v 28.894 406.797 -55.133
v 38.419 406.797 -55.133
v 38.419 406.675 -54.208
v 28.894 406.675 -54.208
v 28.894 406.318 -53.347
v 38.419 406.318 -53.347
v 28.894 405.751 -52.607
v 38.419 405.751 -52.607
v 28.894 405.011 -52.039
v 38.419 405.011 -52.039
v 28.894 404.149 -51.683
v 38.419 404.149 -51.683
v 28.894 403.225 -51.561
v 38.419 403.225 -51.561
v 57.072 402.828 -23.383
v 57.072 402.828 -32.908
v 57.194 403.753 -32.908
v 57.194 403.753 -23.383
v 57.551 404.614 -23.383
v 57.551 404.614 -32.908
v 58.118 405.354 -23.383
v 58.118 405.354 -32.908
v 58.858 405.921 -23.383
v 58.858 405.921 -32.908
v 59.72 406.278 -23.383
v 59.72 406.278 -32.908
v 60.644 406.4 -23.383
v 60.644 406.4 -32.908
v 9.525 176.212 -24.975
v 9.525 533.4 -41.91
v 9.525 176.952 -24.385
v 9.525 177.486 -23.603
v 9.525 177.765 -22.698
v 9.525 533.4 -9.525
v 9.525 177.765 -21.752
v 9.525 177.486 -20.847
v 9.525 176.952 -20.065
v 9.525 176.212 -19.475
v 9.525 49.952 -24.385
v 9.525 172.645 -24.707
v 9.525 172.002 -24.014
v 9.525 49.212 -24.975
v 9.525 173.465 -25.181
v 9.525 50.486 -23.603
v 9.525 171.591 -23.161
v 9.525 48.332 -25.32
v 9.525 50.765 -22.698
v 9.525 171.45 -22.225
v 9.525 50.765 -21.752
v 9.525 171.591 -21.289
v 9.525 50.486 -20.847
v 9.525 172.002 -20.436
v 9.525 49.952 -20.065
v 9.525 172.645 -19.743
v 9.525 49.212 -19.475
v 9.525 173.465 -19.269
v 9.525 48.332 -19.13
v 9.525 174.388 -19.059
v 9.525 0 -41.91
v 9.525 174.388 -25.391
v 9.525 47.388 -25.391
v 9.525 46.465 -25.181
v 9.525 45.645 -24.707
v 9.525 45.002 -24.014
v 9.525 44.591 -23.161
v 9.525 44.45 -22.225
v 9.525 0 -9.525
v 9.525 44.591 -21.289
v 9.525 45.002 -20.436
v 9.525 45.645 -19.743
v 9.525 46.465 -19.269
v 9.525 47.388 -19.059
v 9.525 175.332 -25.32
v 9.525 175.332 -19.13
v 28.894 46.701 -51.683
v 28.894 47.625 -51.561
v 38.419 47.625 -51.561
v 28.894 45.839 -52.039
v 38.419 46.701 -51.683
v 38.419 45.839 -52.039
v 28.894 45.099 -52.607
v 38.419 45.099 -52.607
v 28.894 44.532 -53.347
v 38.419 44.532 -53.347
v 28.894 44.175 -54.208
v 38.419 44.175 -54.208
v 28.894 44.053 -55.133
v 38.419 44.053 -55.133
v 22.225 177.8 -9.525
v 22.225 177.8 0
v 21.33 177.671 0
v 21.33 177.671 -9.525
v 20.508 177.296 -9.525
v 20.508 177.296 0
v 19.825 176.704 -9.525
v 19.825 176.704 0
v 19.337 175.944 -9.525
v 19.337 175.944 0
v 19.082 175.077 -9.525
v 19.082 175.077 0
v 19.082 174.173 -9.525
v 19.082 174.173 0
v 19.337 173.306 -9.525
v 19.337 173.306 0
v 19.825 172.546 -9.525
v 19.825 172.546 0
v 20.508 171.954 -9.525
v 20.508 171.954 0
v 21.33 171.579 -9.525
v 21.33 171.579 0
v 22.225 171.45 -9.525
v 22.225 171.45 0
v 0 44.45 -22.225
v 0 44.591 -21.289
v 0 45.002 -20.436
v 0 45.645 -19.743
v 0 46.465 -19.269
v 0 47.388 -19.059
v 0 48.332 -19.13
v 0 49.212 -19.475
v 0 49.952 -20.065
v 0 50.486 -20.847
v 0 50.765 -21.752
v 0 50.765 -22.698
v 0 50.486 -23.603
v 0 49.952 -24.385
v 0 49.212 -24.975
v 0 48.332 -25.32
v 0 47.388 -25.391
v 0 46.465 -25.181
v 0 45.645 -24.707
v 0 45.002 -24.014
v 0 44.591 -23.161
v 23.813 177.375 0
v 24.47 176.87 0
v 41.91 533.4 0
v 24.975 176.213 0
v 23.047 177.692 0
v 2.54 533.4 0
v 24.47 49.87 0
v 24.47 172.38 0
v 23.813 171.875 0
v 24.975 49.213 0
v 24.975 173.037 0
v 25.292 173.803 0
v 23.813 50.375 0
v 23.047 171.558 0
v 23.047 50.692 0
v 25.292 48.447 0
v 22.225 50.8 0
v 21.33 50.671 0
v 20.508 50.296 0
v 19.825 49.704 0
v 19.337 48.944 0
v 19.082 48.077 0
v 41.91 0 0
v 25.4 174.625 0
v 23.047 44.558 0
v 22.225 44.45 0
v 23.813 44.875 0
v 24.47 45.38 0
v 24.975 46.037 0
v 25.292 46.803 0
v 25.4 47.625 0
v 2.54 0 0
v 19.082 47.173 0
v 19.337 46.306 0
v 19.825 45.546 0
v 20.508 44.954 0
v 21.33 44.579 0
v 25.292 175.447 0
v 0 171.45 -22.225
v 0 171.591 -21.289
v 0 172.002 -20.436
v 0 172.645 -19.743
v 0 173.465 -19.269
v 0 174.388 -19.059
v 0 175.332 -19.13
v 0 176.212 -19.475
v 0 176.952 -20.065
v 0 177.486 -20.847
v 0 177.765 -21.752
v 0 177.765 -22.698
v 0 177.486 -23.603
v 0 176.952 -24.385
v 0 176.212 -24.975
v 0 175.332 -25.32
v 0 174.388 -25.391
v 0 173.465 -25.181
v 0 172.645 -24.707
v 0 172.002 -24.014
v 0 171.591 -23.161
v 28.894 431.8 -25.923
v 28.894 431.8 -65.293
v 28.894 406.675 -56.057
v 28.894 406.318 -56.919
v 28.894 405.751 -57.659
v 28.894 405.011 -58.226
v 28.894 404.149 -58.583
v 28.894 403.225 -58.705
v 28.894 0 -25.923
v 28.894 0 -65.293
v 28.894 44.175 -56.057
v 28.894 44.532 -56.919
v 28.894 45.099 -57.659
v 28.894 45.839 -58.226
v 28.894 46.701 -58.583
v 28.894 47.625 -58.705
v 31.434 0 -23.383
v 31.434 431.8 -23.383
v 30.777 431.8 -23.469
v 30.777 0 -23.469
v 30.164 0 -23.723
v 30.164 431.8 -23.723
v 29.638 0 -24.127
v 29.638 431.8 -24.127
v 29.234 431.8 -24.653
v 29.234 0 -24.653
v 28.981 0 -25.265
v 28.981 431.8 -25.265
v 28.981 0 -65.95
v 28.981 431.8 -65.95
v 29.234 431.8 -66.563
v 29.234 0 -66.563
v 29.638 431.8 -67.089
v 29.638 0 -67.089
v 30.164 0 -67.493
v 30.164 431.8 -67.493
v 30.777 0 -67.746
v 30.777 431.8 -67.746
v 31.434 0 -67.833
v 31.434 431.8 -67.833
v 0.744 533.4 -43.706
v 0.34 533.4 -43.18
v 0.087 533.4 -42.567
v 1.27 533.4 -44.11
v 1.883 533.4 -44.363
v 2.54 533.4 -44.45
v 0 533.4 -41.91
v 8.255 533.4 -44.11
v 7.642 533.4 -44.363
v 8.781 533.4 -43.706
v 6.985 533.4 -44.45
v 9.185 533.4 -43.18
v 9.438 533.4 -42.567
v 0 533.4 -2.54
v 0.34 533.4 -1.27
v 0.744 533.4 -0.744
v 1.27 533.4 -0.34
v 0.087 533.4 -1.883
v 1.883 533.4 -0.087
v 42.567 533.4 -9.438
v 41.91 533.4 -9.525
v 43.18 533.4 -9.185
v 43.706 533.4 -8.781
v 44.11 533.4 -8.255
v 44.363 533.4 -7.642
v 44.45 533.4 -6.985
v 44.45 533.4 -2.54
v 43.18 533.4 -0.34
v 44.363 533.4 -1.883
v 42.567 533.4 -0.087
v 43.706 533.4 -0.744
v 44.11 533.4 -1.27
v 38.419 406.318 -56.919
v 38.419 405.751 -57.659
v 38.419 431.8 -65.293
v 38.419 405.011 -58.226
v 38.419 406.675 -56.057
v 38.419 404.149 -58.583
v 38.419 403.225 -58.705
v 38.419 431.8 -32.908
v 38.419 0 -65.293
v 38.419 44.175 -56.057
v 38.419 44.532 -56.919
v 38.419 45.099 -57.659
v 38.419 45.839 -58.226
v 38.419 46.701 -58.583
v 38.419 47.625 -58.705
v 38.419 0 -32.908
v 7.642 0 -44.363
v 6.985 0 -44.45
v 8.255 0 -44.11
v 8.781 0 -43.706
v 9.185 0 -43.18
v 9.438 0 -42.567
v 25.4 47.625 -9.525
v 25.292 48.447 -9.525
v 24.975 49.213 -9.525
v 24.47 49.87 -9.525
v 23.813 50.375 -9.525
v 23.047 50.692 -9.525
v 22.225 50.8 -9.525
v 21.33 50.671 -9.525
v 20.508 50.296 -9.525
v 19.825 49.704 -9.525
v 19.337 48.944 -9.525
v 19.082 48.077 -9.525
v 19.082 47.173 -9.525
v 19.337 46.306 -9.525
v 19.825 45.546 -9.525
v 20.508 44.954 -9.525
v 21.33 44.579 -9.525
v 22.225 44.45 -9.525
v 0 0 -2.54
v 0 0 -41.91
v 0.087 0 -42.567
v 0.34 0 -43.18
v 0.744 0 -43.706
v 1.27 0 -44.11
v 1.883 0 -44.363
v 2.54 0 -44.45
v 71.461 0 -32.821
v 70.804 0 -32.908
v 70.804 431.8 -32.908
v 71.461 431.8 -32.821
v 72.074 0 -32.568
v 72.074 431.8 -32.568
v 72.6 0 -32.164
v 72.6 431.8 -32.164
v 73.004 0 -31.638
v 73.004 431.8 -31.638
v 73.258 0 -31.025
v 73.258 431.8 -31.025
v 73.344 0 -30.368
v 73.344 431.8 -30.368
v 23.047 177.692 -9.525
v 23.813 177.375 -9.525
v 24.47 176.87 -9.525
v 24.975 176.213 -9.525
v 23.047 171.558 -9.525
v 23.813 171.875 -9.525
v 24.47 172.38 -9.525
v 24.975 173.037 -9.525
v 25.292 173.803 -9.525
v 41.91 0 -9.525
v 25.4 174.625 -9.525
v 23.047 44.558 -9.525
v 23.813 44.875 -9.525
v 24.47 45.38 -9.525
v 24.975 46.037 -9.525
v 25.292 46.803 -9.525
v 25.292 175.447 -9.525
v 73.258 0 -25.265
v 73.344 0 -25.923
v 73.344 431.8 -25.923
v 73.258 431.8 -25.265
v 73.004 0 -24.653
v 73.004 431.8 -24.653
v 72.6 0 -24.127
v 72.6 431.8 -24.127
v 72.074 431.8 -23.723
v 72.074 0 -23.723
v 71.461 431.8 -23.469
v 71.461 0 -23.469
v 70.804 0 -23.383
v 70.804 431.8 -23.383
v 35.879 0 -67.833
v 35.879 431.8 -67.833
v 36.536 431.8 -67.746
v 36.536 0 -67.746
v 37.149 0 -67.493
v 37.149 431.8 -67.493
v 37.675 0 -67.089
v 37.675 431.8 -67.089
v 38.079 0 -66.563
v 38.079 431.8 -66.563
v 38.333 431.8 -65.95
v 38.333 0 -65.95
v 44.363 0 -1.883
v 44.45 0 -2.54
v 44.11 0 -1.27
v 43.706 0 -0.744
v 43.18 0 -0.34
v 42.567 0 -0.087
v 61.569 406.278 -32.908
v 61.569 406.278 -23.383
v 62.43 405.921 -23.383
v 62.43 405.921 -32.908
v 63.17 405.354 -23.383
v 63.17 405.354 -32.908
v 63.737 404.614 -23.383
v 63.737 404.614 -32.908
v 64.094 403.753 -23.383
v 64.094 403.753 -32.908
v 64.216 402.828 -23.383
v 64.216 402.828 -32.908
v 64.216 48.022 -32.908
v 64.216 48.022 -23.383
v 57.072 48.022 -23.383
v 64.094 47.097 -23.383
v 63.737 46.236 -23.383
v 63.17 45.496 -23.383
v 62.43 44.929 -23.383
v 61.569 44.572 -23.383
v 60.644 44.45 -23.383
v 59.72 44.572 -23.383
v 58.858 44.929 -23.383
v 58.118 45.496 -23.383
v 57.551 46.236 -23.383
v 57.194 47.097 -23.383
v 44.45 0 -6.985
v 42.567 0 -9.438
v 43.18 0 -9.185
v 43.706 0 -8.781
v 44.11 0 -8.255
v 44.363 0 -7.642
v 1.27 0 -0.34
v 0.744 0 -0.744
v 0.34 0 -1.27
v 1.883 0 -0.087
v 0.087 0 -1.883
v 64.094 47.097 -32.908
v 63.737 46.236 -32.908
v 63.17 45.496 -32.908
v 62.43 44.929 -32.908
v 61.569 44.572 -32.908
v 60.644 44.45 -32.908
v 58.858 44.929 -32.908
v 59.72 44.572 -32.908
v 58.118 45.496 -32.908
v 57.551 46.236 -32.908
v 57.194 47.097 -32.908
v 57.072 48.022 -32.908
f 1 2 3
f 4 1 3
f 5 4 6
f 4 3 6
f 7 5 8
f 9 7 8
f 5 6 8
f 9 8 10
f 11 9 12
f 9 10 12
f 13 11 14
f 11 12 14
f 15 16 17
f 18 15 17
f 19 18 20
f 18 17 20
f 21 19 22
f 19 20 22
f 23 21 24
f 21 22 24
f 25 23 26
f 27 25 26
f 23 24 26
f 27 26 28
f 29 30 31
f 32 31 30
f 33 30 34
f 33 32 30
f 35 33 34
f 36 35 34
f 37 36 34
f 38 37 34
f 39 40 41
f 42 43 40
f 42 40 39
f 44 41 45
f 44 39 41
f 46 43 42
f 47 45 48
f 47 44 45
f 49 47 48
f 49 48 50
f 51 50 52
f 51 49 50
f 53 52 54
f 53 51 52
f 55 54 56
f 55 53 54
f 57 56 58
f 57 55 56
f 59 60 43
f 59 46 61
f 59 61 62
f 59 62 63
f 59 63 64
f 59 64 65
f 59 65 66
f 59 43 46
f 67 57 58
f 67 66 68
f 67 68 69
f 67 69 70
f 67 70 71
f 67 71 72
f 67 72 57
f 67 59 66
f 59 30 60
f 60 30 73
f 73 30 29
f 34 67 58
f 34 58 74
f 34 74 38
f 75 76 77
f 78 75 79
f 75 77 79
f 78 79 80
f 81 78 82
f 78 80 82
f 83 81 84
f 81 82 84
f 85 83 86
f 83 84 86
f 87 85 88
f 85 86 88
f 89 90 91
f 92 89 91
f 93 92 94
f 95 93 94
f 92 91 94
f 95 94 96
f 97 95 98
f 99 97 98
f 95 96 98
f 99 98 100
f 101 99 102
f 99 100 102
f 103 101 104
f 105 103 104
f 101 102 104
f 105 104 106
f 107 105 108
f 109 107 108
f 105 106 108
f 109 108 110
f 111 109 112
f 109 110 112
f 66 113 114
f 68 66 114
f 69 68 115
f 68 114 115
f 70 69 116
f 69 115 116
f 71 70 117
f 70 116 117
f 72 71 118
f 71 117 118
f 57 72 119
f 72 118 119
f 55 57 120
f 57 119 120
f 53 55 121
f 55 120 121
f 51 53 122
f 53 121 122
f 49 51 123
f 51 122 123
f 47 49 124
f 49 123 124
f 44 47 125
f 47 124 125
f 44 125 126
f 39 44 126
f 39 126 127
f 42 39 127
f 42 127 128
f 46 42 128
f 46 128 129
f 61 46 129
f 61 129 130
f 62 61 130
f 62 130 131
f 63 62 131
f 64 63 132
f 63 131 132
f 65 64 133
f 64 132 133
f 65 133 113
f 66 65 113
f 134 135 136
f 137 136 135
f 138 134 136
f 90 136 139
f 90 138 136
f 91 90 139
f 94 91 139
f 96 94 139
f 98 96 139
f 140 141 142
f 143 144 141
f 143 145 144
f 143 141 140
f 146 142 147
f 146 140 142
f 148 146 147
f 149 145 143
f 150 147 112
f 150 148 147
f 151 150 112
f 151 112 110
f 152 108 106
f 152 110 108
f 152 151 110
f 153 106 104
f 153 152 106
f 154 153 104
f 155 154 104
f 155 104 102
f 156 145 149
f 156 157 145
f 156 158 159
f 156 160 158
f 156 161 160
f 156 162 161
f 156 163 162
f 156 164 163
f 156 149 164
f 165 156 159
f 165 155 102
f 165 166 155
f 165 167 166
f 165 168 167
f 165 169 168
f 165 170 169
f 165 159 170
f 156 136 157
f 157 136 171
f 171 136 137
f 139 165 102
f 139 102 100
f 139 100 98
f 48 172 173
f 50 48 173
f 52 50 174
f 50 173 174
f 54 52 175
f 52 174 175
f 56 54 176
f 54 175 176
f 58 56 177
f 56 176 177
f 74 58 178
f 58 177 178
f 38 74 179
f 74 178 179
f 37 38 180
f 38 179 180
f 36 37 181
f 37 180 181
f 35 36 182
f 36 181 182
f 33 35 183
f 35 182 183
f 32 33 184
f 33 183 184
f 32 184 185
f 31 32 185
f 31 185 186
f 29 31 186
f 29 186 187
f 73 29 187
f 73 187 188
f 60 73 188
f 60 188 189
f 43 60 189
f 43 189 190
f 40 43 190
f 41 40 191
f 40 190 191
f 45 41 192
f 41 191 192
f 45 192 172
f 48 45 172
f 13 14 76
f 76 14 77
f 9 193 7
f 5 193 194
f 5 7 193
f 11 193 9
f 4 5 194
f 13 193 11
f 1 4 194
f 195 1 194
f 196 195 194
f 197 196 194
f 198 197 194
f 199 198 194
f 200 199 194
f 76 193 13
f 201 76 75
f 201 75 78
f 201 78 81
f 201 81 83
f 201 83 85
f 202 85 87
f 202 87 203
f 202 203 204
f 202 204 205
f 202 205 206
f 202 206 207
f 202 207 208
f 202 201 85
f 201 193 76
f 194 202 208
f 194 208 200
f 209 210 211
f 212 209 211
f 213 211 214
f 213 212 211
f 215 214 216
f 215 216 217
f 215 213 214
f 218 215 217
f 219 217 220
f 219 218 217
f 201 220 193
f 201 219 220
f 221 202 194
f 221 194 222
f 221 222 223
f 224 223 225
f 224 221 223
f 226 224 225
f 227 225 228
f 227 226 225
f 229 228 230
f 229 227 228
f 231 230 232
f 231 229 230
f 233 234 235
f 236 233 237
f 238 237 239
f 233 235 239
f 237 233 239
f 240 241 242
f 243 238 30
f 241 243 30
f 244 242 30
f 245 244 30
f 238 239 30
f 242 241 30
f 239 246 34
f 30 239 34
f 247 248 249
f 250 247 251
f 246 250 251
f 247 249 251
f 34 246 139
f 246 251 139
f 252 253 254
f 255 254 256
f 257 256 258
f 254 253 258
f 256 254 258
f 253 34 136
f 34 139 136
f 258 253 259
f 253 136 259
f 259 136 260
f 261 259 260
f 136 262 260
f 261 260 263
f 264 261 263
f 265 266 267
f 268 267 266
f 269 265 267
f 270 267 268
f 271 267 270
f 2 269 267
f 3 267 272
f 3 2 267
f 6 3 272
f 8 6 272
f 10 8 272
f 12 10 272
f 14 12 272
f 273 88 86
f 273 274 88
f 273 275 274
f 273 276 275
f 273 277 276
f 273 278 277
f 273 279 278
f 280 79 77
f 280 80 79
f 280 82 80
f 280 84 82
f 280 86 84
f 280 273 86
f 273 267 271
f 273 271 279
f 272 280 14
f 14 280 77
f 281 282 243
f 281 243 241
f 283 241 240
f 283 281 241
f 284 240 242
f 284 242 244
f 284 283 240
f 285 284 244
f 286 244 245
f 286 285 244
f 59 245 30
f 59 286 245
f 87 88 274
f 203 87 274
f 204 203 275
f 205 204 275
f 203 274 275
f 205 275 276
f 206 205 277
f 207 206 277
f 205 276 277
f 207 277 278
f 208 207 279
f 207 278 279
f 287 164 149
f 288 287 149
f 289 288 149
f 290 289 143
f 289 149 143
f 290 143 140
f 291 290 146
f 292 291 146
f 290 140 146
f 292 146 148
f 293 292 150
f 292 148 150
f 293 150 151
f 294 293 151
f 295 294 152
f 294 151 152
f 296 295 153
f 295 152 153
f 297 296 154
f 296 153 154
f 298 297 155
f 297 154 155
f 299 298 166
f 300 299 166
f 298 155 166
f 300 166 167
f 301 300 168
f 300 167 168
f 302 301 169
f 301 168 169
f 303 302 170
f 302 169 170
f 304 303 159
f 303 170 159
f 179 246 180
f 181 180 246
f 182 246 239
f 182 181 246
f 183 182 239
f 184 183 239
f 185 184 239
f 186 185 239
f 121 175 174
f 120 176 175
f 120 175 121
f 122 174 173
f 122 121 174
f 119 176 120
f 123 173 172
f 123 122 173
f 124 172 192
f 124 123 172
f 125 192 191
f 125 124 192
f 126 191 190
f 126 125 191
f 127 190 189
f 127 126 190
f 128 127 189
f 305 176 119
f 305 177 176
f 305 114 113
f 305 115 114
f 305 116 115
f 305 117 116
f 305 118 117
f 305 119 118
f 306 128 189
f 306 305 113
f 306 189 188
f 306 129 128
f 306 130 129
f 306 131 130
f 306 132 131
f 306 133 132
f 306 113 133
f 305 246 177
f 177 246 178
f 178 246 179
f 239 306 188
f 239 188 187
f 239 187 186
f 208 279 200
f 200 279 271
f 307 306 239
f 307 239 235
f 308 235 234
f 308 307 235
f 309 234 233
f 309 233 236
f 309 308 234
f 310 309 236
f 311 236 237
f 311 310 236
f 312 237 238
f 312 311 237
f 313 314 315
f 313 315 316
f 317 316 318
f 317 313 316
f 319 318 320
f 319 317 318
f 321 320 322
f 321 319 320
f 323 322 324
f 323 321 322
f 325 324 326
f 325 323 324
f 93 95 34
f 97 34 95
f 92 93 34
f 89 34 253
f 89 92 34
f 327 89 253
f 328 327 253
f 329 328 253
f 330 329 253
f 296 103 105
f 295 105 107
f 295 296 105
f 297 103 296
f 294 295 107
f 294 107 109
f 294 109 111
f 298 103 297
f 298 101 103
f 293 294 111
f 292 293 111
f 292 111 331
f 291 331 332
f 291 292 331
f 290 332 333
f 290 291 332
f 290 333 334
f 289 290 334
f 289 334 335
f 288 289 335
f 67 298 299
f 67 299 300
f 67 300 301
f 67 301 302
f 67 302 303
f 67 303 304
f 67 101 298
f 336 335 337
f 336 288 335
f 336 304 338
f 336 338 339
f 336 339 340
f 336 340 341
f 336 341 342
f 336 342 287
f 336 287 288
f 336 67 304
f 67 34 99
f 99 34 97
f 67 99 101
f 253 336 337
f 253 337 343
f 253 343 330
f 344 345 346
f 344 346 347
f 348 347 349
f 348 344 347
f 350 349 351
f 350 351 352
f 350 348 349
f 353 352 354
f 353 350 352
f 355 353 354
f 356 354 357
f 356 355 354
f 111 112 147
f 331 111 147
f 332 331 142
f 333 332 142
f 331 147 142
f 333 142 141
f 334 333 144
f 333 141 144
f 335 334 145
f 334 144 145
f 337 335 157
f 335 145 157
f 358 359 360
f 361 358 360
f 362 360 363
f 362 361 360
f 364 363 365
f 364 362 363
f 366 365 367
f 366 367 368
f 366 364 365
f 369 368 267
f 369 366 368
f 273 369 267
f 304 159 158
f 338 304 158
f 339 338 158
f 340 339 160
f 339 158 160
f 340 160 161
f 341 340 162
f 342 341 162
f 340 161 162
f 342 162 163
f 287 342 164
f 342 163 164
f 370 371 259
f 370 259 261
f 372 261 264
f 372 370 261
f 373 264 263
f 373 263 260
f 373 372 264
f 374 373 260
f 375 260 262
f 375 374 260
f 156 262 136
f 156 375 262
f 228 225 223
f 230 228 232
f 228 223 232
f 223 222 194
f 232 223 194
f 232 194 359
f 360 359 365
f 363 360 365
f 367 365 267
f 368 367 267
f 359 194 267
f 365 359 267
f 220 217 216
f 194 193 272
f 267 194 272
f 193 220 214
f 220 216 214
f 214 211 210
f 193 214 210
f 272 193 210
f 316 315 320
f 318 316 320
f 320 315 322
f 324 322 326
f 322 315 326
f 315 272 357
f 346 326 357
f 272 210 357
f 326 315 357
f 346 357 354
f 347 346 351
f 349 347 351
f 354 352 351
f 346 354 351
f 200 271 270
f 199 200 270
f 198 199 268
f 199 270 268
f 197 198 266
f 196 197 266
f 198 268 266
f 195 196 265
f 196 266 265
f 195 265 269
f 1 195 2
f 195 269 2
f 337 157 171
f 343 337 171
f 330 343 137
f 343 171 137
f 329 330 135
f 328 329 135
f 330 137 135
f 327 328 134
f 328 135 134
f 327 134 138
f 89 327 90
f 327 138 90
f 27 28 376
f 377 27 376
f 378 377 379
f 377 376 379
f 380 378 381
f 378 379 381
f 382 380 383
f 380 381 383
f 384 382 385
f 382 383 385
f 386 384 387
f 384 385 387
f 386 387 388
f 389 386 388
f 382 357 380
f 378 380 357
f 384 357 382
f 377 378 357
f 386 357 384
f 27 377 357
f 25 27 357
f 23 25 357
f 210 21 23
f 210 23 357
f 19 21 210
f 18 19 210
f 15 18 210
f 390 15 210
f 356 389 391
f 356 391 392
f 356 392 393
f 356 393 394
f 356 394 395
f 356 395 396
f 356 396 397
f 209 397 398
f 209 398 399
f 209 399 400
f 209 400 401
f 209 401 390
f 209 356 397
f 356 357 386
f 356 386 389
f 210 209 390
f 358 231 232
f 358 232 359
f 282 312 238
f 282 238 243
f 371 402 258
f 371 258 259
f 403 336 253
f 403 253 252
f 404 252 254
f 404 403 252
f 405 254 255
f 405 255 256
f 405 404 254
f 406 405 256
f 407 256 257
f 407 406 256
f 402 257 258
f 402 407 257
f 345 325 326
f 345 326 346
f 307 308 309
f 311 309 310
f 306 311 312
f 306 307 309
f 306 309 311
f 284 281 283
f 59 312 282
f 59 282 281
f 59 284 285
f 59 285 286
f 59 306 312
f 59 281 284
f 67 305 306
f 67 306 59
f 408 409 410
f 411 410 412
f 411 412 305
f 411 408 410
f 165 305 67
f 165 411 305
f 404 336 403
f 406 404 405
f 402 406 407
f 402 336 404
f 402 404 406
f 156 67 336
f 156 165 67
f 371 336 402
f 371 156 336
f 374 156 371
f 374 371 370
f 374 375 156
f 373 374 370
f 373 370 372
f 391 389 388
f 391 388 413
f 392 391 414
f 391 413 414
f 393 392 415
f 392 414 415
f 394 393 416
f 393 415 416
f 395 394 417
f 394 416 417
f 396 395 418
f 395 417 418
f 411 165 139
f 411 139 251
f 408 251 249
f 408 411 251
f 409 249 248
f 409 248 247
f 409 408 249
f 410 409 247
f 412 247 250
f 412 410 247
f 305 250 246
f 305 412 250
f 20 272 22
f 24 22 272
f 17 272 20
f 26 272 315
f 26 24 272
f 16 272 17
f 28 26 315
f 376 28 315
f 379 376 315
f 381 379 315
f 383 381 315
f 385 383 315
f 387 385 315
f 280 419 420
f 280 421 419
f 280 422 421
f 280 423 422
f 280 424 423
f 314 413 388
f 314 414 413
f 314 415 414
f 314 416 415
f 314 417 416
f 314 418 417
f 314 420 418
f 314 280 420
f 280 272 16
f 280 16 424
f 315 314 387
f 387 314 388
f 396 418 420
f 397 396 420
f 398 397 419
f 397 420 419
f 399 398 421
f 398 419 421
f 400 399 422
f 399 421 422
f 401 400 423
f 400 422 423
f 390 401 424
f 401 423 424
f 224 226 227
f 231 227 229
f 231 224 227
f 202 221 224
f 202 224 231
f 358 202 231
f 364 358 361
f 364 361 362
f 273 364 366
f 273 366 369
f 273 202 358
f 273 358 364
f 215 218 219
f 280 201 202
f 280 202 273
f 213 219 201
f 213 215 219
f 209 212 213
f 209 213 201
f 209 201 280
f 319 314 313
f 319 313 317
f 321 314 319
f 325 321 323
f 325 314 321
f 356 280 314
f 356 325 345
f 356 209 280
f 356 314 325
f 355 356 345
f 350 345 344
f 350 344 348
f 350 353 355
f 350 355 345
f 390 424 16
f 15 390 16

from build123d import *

# Parameters (mm, degrees)
F2_DEPTH  = 533.4
F3_DEPTH  = 431.8
F5_DEPTH  = 9.525
F7_DEPTH  = 9.525
F9_DEPTH  = 9.525
F10_DEPTH = 9.525
F12_DEPTH = 9.525


with BuildPart() as f2:
    # F0 (on Front) → F2 (new body)
    with BuildSketch(Plane.XZ):
        with BuildLine():
            Line((0, -2.54), (0, -41.91))
            ThreePointArc((0, -41.91), (0.7439487758, -43.7060512242), (2.54, -44.45))
            Line((2.54, -44.45), (6.985, -44.45))
            ThreePointArc((6.985, -44.45), (8.7810512242, -43.7060512242), (9.525, -41.91))
            Line((9.525, -41.91), (9.525, -9.525))
            Line((9.525, -9.525), (41.91, -9.525))
            ThreePointArc((41.91, -9.525), (43.7060512242, -8.7810512242), (44.45, -6.985))
            Line((44.45, -6.985), (44.45, -2.54))
            ThreePointArc((44.45, -2.54), (43.7060512242, -0.7439487758), (41.91, 0))
            Line((41.91, 0), (2.54, 0))
            ThreePointArc((2.54, 0), (0.7439487758, -0.7439487758), (0, -2.54))
        make_face()
    extrude(amount=-F2_DEPTH)

    # F8 (on face) → F9 (cut, through all)
    with BuildSketch(Plane(origin=(0, 0, 0), x_dir=(0, -1, 0), z_dir=(-1, 0, 0))):
        with BuildLine():
            ThreePointArc((-50.8, -22.225), (-47.625, -25.4), (-44.45, -22.225))
            Line((-44.45, -22.225), (-47.625, -22.225))
            Line((-47.625, -22.225), (-50.8, -22.225))
        make_face()
        with BuildLine():
            Line((-47.625, -22.225), (-44.45, -22.225))
            ThreePointArc((-44.45, -22.225), (-47.625, -19.05), (-50.8, -22.225))
            Line((-50.8, -22.225), (-47.625, -22.225))
        make_face()
        with BuildLine():
            ThreePointArc((-177.8, -22.225), (-174.625, -25.4), (-171.45, -22.225))
            Line((-171.45, -22.225), (-174.625, -22.225))
            Line((-174.625, -22.225), (-177.8, -22.225))
        make_face()
        with BuildLine():
            Line((-174.625, -22.225), (-171.45, -22.225))
            ThreePointArc((-171.45, -22.225), (-174.625, -19.05), (-177.8, -22.225))
            Line((-177.8, -22.225), (-174.625, -22.225))
        make_face()
    extrude(amount=-F9_DEPTH, mode=Mode.SUBTRACT)

    # F8 (on face) → F10 (cut, through all)
    with BuildSketch(Plane(origin=(0, 0, 0), x_dir=(0, -1, 0), z_dir=(-1, 0, 0))):
        with BuildLine():
            ThreePointArc((-50.8, -22.225), (-47.625, -25.4), (-44.45, -22.225))
            Line((-44.45, -22.225), (-47.625, -22.225))
            Line((-47.625, -22.225), (-50.8, -22.225))
        make_face()
        with BuildLine():
            Line((-47.625, -22.225), (-44.45, -22.225))
            ThreePointArc((-44.45, -22.225), (-47.625, -19.05), (-50.8, -22.225))
            Line((-50.8, -22.225), (-47.625, -22.225))
        make_face()
        with BuildLine():
            ThreePointArc((-177.8, -22.225), (-174.625, -25.4), (-171.45, -22.225))
            Line((-171.45, -22.225), (-174.625, -22.225))
            Line((-174.625, -22.225), (-177.8, -22.225))
        make_face()
        with BuildLine():
            Line((-174.625, -22.225), (-171.45, -22.225))
            ThreePointArc((-171.45, -22.225), (-174.625, -19.05), (-177.8, -22.225))
            Line((-177.8, -22.225), (-174.625, -22.225))
        make_face()
    extrude(amount=-F10_DEPTH, mode=Mode.SUBTRACT)

    # F11 (on face) → F12 (cut, through all)
    with BuildSketch(Plane.XY):
        with BuildLine():
            Line((22.225, 47.625), (22.225, 44.45))
            ThreePointArc((22.225, 44.45), (24.4700640303, 45.3799359697), (25.4, 47.625))
            ThreePointArc((25.4, 47.625), (24.4700640303, 49.8700640303), (22.225, 50.8))
            Line((22.225, 50.8), (22.225, 47.625))
        make_face()
        with BuildLine():
            ThreePointArc((22.225, 50.8), (19.05, 47.625), (22.225, 44.45))
            Line((22.225, 44.45), (22.225, 47.625))
            Line((22.225, 47.625), (22.225, 50.8))
        make_face()
        with BuildLine():
            Line((22.225, 174.625), (22.225, 171.45))
            ThreePointArc((22.225, 171.45), (24.4700640303, 172.3799359697), (25.4, 174.625))
            ThreePointArc((25.4, 174.625), (24.4700640303, 176.8700640303), (22.225, 177.8))
            Line((22.225, 177.8), (22.225, 174.625))
        make_face()
        with BuildLine():
            ThreePointArc((22.225, 177.8), (19.05, 174.625), (22.225, 171.45))
            Line((22.225, 171.45), (22.225, 174.625))
            Line((22.225, 174.625), (22.225, 177.8))
        make_face()
    extrude(amount=-F12_DEPTH, mode=Mode.SUBTRACT)


with BuildPart() as f3:
    # F1 (on Front) → F3 (new body)
    with BuildSketch(Plane.XZ):
        with BuildLine():
            Line((28.8940604091, -25.9228175128), (28.8940604091, -65.2928175128))
            ThreePointArc((28.8940604091, -65.2928175128), (29.6380091849, -67.088868737), (31.4340604091, -67.8328175128))
            Line((31.4340604091, -67.8328175128), (35.8790604091, -67.8328175128))
            ThreePointArc((35.8790604091, -67.8328175128), (37.6751116333, -67.088868737), (38.4190604091, -65.2928175128))
            Line((38.4190604091, -65.2928175128), (38.4190604091, -32.9078175128))
            Line((38.4190604091, -32.9078175128), (70.8040604091, -32.9078175128))
            ThreePointArc((70.8040604091, -32.9078175128), (72.6001116333, -32.163868737), (73.3440604091, -30.3678175128))
            Line((73.3440604091, -30.3678175128), (73.3440604091, -25.9228175128))
            ThreePointArc((73.3440604091, -25.9228175128), (72.6001116333, -24.1267662885), (70.8040604091, -23.3828175128))
            Line((70.8040604091, -23.3828175128), (31.4340604091, -23.3828175128))
            ThreePointArc((31.4340604091, -23.3828175128), (29.6380091849, -24.1267662885), (28.8940604091, -25.9228175128))
        make_face()
    extrude(amount=-F3_DEPTH)

    # F4 (on face) → F5 (cut, through all)
    with BuildSketch(Plane(origin=(0, 0, -32.9078175128), x_dir=(1, 0, 0), z_dir=(0, 0, -1))):
        with BuildLine():
            ThreePointArc((60.6440604091, -51.59375), (63.1697574431, -50.5475720341), (64.2159354091, -48.021875))
            ThreePointArc((64.2159354091, -48.021875), (63.1697574431, -45.4961779659), (60.6440604091, -44.45))
            Line((60.6440604091, -44.45), (60.6440604091, -51.59375))
        make_face()
        with BuildLine():
            Line((64.2159354091, -402.828125), (64.2159354091, -48.021875))
            ThreePointArc((64.2159354091, -48.021875), (63.1697574431, -50.5475720341), (60.6440604091, -51.59375))
            Line((60.6440604091, -51.59375), (60.6440604091, -399.25625))
            ThreePointArc((60.6440604091, -399.25625), (63.1697574431, -400.3024279659), (64.2159354091, -402.828125))
        make_face()
        with BuildLine():
            Line((60.6440604091, -51.59375), (60.6440604091, -44.45))
            ThreePointArc((60.6440604091, -44.45), (58.118363375, -45.4961779659), (57.0721854091, -48.021875))
            ThreePointArc((57.0721854091, -48.021875), (58.118363375, -50.5475720341), (60.6440604091, -51.59375))
        make_face()
        with BuildLine():
            Line((60.6440604091, -399.25625), (60.6440604091, -51.59375))
            ThreePointArc((60.6440604091, -51.59375), (58.118363375, -50.5475720341), (57.0721854091, -48.021875))
            Line((57.0721854091, -48.021875), (57.0721854091, -402.828125))
            ThreePointArc((57.0721854091, -402.828125), (58.118363375, -400.3024279659), (60.6440604091, -399.25625))
        make_face()
        with BuildLine():
            ThreePointArc((60.6440604091, -406.4), (63.1697574431, -405.3538220341), (64.2159354091, -402.828125))
            ThreePointArc((64.2159354091, -402.828125), (63.1697574431, -400.3024279659), (60.6440604091, -399.25625))
            Line((60.6440604091, -399.25625), (60.6440604091, -406.4))
        make_face()
        with BuildLine():
            Line((60.6440604091, -406.4), (60.6440604091, -399.25625))
            ThreePointArc((60.6440604091, -399.25625), (58.118363375, -400.3024279659), (57.0721854091, -402.828125))
            ThreePointArc((57.0721854091, -402.828125), (58.118363375, -405.3538220341), (60.6440604091, -406.4))
        make_face()
    extrude(amount=-F5_DEPTH, mode=Mode.SUBTRACT)

    # F6 (on face) → F7 (cut, through all)
    with BuildSketch(Plane.YZ.offset(38.4190604091)):
        with BuildLine():
            ThreePointArc((47.625, -58.7046925128), (50.1506970341, -57.6585145468), (51.196875, -55.1328175128))
            ThreePointArc((51.196875, -55.1328175128), (50.1506970341, -52.6071204787), (47.625, -51.5609425128))
            ThreePointArc((47.625, -51.5609425128), (45.0993029659, -52.6071204787), (44.053125, -55.1328175128))
            ThreePointArc((44.053125, -55.1328175128), (45.0993029659, -57.6585145468), (47.625, -58.7046925128))
        make_face()
        with BuildLine():
            ThreePointArc((47.625, -51.5609425128), (50.1506970341, -52.6071204787), (51.196875, -55.1328175128))
            ThreePointArc((51.196875, -55.1328175128), (50.1506970341, -57.6585145468), (47.625, -58.7046925128))
            Line((47.625, -58.7046925128), (403.225, -58.7046925128))
            ThreePointArc((403.225, -58.7046925128), (399.653125, -55.1328175128), (403.225, -51.5609425128))
            Line((403.225, -51.5609425128), (47.625, -51.5609425128))
        make_face()
        with BuildLine():
            ThreePointArc((406.796875, -55.1328175128), (405.7506970341, -52.6071204787), (403.225, -51.5609425128))
            ThreePointArc((403.225, -51.5609425128), (399.653125, -55.1328175128), (403.225, -58.7046925128))
            ThreePointArc((403.225, -58.7046925128), (405.7506970341, -57.6585145468), (406.796875, -55.1328175128))
        make_face()
    extrude(amount=-F7_DEPTH, mode=Mode.SUBTRACT)


solid = Compound([f2.part, f3.part])
